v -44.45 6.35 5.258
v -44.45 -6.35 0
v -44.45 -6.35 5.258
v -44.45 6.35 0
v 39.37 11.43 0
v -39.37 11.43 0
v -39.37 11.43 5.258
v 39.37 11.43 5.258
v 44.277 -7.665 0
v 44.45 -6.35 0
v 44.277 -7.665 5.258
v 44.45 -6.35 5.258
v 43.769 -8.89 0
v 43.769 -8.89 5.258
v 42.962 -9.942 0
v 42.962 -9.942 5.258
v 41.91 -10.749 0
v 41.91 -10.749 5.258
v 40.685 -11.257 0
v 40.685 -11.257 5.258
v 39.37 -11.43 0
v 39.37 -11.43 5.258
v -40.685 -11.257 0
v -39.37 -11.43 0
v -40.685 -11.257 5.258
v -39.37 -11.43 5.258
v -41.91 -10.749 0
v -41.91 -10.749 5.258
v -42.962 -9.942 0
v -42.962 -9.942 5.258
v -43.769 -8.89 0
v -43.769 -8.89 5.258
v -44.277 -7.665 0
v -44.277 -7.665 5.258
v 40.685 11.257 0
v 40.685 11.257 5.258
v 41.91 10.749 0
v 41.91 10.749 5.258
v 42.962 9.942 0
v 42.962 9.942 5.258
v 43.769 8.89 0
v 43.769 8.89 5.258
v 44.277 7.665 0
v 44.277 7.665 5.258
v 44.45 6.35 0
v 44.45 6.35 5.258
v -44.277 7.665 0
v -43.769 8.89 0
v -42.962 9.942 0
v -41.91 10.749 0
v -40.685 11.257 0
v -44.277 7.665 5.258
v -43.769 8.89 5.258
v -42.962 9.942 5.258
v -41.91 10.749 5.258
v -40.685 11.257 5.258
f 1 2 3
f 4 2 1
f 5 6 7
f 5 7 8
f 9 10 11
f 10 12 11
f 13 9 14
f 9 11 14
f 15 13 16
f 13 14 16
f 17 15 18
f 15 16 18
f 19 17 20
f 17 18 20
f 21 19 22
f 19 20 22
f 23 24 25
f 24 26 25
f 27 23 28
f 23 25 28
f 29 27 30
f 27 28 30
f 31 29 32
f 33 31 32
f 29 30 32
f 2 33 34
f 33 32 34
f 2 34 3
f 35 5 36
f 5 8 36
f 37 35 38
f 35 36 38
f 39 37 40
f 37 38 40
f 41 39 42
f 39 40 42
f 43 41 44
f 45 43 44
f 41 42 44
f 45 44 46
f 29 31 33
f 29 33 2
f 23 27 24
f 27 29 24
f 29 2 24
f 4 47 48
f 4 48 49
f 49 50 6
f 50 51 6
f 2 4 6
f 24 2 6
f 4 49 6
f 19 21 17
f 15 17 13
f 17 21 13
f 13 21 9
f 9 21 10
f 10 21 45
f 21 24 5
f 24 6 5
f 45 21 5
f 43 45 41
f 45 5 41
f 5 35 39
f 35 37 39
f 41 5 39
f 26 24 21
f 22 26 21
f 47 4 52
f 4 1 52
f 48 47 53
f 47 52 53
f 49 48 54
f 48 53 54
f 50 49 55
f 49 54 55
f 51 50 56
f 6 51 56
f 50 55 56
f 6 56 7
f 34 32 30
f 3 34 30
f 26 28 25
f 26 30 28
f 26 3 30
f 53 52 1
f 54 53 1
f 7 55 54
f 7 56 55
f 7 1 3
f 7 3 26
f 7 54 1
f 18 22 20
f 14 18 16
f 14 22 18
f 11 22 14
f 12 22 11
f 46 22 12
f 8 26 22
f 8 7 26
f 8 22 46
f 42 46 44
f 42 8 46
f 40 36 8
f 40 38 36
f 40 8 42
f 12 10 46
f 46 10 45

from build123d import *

# Parameters (mm, degrees)
SKETCH1_W           = 88.9
SKETCH1_H           = 22.86
BOSS_EXTRUDE1_DEPTH = 5.2578
FILLET1_R           = 5.08
FILLET2_R           = 5.08
FILLET3_R           = 5.08
FILLET4_R           = 5.08


with BuildPart() as part:
    # Sketch1 → Boss-Extrude1 (new body)
    with BuildSketch(Plane.XY):
        Rectangle(SKETCH1_W, SKETCH1_H)
    extrude(amount=BOSS_EXTRUDE1_DEPTH)

    # Fillet1
    fillet1_edges = [part.edges().sort_by_distance(p)[0] for p in [
        (-44.45, 11.43, 2.6289),
    ]]
    fillet(fillet1_edges, radius=FILLET1_R)

    # Fillet2
    fillet2_edges = [part.edges().sort_by_distance(p)[0] for p in [
        (44.45, 11.43, 2.6289),
    ]]
    fillet(fillet2_edges, radius=FILLET2_R)

    # Fillet3
    fillet3_edges = [part.edges().sort_by_distance(p)[0] for p in [
        (44.45, -11.43, 2.6289),
    ]]
    fillet(fillet3_edges, radius=FILLET3_R)

    # Fillet4
    fillet4_edges = [part.edges().sort_by_distance(p)[0] for p in [
        (-44.45, -11.43, 2.6289),
    ]]
    fillet(fillet4_edges, radius=FILLET4_R)


solid = part.part
